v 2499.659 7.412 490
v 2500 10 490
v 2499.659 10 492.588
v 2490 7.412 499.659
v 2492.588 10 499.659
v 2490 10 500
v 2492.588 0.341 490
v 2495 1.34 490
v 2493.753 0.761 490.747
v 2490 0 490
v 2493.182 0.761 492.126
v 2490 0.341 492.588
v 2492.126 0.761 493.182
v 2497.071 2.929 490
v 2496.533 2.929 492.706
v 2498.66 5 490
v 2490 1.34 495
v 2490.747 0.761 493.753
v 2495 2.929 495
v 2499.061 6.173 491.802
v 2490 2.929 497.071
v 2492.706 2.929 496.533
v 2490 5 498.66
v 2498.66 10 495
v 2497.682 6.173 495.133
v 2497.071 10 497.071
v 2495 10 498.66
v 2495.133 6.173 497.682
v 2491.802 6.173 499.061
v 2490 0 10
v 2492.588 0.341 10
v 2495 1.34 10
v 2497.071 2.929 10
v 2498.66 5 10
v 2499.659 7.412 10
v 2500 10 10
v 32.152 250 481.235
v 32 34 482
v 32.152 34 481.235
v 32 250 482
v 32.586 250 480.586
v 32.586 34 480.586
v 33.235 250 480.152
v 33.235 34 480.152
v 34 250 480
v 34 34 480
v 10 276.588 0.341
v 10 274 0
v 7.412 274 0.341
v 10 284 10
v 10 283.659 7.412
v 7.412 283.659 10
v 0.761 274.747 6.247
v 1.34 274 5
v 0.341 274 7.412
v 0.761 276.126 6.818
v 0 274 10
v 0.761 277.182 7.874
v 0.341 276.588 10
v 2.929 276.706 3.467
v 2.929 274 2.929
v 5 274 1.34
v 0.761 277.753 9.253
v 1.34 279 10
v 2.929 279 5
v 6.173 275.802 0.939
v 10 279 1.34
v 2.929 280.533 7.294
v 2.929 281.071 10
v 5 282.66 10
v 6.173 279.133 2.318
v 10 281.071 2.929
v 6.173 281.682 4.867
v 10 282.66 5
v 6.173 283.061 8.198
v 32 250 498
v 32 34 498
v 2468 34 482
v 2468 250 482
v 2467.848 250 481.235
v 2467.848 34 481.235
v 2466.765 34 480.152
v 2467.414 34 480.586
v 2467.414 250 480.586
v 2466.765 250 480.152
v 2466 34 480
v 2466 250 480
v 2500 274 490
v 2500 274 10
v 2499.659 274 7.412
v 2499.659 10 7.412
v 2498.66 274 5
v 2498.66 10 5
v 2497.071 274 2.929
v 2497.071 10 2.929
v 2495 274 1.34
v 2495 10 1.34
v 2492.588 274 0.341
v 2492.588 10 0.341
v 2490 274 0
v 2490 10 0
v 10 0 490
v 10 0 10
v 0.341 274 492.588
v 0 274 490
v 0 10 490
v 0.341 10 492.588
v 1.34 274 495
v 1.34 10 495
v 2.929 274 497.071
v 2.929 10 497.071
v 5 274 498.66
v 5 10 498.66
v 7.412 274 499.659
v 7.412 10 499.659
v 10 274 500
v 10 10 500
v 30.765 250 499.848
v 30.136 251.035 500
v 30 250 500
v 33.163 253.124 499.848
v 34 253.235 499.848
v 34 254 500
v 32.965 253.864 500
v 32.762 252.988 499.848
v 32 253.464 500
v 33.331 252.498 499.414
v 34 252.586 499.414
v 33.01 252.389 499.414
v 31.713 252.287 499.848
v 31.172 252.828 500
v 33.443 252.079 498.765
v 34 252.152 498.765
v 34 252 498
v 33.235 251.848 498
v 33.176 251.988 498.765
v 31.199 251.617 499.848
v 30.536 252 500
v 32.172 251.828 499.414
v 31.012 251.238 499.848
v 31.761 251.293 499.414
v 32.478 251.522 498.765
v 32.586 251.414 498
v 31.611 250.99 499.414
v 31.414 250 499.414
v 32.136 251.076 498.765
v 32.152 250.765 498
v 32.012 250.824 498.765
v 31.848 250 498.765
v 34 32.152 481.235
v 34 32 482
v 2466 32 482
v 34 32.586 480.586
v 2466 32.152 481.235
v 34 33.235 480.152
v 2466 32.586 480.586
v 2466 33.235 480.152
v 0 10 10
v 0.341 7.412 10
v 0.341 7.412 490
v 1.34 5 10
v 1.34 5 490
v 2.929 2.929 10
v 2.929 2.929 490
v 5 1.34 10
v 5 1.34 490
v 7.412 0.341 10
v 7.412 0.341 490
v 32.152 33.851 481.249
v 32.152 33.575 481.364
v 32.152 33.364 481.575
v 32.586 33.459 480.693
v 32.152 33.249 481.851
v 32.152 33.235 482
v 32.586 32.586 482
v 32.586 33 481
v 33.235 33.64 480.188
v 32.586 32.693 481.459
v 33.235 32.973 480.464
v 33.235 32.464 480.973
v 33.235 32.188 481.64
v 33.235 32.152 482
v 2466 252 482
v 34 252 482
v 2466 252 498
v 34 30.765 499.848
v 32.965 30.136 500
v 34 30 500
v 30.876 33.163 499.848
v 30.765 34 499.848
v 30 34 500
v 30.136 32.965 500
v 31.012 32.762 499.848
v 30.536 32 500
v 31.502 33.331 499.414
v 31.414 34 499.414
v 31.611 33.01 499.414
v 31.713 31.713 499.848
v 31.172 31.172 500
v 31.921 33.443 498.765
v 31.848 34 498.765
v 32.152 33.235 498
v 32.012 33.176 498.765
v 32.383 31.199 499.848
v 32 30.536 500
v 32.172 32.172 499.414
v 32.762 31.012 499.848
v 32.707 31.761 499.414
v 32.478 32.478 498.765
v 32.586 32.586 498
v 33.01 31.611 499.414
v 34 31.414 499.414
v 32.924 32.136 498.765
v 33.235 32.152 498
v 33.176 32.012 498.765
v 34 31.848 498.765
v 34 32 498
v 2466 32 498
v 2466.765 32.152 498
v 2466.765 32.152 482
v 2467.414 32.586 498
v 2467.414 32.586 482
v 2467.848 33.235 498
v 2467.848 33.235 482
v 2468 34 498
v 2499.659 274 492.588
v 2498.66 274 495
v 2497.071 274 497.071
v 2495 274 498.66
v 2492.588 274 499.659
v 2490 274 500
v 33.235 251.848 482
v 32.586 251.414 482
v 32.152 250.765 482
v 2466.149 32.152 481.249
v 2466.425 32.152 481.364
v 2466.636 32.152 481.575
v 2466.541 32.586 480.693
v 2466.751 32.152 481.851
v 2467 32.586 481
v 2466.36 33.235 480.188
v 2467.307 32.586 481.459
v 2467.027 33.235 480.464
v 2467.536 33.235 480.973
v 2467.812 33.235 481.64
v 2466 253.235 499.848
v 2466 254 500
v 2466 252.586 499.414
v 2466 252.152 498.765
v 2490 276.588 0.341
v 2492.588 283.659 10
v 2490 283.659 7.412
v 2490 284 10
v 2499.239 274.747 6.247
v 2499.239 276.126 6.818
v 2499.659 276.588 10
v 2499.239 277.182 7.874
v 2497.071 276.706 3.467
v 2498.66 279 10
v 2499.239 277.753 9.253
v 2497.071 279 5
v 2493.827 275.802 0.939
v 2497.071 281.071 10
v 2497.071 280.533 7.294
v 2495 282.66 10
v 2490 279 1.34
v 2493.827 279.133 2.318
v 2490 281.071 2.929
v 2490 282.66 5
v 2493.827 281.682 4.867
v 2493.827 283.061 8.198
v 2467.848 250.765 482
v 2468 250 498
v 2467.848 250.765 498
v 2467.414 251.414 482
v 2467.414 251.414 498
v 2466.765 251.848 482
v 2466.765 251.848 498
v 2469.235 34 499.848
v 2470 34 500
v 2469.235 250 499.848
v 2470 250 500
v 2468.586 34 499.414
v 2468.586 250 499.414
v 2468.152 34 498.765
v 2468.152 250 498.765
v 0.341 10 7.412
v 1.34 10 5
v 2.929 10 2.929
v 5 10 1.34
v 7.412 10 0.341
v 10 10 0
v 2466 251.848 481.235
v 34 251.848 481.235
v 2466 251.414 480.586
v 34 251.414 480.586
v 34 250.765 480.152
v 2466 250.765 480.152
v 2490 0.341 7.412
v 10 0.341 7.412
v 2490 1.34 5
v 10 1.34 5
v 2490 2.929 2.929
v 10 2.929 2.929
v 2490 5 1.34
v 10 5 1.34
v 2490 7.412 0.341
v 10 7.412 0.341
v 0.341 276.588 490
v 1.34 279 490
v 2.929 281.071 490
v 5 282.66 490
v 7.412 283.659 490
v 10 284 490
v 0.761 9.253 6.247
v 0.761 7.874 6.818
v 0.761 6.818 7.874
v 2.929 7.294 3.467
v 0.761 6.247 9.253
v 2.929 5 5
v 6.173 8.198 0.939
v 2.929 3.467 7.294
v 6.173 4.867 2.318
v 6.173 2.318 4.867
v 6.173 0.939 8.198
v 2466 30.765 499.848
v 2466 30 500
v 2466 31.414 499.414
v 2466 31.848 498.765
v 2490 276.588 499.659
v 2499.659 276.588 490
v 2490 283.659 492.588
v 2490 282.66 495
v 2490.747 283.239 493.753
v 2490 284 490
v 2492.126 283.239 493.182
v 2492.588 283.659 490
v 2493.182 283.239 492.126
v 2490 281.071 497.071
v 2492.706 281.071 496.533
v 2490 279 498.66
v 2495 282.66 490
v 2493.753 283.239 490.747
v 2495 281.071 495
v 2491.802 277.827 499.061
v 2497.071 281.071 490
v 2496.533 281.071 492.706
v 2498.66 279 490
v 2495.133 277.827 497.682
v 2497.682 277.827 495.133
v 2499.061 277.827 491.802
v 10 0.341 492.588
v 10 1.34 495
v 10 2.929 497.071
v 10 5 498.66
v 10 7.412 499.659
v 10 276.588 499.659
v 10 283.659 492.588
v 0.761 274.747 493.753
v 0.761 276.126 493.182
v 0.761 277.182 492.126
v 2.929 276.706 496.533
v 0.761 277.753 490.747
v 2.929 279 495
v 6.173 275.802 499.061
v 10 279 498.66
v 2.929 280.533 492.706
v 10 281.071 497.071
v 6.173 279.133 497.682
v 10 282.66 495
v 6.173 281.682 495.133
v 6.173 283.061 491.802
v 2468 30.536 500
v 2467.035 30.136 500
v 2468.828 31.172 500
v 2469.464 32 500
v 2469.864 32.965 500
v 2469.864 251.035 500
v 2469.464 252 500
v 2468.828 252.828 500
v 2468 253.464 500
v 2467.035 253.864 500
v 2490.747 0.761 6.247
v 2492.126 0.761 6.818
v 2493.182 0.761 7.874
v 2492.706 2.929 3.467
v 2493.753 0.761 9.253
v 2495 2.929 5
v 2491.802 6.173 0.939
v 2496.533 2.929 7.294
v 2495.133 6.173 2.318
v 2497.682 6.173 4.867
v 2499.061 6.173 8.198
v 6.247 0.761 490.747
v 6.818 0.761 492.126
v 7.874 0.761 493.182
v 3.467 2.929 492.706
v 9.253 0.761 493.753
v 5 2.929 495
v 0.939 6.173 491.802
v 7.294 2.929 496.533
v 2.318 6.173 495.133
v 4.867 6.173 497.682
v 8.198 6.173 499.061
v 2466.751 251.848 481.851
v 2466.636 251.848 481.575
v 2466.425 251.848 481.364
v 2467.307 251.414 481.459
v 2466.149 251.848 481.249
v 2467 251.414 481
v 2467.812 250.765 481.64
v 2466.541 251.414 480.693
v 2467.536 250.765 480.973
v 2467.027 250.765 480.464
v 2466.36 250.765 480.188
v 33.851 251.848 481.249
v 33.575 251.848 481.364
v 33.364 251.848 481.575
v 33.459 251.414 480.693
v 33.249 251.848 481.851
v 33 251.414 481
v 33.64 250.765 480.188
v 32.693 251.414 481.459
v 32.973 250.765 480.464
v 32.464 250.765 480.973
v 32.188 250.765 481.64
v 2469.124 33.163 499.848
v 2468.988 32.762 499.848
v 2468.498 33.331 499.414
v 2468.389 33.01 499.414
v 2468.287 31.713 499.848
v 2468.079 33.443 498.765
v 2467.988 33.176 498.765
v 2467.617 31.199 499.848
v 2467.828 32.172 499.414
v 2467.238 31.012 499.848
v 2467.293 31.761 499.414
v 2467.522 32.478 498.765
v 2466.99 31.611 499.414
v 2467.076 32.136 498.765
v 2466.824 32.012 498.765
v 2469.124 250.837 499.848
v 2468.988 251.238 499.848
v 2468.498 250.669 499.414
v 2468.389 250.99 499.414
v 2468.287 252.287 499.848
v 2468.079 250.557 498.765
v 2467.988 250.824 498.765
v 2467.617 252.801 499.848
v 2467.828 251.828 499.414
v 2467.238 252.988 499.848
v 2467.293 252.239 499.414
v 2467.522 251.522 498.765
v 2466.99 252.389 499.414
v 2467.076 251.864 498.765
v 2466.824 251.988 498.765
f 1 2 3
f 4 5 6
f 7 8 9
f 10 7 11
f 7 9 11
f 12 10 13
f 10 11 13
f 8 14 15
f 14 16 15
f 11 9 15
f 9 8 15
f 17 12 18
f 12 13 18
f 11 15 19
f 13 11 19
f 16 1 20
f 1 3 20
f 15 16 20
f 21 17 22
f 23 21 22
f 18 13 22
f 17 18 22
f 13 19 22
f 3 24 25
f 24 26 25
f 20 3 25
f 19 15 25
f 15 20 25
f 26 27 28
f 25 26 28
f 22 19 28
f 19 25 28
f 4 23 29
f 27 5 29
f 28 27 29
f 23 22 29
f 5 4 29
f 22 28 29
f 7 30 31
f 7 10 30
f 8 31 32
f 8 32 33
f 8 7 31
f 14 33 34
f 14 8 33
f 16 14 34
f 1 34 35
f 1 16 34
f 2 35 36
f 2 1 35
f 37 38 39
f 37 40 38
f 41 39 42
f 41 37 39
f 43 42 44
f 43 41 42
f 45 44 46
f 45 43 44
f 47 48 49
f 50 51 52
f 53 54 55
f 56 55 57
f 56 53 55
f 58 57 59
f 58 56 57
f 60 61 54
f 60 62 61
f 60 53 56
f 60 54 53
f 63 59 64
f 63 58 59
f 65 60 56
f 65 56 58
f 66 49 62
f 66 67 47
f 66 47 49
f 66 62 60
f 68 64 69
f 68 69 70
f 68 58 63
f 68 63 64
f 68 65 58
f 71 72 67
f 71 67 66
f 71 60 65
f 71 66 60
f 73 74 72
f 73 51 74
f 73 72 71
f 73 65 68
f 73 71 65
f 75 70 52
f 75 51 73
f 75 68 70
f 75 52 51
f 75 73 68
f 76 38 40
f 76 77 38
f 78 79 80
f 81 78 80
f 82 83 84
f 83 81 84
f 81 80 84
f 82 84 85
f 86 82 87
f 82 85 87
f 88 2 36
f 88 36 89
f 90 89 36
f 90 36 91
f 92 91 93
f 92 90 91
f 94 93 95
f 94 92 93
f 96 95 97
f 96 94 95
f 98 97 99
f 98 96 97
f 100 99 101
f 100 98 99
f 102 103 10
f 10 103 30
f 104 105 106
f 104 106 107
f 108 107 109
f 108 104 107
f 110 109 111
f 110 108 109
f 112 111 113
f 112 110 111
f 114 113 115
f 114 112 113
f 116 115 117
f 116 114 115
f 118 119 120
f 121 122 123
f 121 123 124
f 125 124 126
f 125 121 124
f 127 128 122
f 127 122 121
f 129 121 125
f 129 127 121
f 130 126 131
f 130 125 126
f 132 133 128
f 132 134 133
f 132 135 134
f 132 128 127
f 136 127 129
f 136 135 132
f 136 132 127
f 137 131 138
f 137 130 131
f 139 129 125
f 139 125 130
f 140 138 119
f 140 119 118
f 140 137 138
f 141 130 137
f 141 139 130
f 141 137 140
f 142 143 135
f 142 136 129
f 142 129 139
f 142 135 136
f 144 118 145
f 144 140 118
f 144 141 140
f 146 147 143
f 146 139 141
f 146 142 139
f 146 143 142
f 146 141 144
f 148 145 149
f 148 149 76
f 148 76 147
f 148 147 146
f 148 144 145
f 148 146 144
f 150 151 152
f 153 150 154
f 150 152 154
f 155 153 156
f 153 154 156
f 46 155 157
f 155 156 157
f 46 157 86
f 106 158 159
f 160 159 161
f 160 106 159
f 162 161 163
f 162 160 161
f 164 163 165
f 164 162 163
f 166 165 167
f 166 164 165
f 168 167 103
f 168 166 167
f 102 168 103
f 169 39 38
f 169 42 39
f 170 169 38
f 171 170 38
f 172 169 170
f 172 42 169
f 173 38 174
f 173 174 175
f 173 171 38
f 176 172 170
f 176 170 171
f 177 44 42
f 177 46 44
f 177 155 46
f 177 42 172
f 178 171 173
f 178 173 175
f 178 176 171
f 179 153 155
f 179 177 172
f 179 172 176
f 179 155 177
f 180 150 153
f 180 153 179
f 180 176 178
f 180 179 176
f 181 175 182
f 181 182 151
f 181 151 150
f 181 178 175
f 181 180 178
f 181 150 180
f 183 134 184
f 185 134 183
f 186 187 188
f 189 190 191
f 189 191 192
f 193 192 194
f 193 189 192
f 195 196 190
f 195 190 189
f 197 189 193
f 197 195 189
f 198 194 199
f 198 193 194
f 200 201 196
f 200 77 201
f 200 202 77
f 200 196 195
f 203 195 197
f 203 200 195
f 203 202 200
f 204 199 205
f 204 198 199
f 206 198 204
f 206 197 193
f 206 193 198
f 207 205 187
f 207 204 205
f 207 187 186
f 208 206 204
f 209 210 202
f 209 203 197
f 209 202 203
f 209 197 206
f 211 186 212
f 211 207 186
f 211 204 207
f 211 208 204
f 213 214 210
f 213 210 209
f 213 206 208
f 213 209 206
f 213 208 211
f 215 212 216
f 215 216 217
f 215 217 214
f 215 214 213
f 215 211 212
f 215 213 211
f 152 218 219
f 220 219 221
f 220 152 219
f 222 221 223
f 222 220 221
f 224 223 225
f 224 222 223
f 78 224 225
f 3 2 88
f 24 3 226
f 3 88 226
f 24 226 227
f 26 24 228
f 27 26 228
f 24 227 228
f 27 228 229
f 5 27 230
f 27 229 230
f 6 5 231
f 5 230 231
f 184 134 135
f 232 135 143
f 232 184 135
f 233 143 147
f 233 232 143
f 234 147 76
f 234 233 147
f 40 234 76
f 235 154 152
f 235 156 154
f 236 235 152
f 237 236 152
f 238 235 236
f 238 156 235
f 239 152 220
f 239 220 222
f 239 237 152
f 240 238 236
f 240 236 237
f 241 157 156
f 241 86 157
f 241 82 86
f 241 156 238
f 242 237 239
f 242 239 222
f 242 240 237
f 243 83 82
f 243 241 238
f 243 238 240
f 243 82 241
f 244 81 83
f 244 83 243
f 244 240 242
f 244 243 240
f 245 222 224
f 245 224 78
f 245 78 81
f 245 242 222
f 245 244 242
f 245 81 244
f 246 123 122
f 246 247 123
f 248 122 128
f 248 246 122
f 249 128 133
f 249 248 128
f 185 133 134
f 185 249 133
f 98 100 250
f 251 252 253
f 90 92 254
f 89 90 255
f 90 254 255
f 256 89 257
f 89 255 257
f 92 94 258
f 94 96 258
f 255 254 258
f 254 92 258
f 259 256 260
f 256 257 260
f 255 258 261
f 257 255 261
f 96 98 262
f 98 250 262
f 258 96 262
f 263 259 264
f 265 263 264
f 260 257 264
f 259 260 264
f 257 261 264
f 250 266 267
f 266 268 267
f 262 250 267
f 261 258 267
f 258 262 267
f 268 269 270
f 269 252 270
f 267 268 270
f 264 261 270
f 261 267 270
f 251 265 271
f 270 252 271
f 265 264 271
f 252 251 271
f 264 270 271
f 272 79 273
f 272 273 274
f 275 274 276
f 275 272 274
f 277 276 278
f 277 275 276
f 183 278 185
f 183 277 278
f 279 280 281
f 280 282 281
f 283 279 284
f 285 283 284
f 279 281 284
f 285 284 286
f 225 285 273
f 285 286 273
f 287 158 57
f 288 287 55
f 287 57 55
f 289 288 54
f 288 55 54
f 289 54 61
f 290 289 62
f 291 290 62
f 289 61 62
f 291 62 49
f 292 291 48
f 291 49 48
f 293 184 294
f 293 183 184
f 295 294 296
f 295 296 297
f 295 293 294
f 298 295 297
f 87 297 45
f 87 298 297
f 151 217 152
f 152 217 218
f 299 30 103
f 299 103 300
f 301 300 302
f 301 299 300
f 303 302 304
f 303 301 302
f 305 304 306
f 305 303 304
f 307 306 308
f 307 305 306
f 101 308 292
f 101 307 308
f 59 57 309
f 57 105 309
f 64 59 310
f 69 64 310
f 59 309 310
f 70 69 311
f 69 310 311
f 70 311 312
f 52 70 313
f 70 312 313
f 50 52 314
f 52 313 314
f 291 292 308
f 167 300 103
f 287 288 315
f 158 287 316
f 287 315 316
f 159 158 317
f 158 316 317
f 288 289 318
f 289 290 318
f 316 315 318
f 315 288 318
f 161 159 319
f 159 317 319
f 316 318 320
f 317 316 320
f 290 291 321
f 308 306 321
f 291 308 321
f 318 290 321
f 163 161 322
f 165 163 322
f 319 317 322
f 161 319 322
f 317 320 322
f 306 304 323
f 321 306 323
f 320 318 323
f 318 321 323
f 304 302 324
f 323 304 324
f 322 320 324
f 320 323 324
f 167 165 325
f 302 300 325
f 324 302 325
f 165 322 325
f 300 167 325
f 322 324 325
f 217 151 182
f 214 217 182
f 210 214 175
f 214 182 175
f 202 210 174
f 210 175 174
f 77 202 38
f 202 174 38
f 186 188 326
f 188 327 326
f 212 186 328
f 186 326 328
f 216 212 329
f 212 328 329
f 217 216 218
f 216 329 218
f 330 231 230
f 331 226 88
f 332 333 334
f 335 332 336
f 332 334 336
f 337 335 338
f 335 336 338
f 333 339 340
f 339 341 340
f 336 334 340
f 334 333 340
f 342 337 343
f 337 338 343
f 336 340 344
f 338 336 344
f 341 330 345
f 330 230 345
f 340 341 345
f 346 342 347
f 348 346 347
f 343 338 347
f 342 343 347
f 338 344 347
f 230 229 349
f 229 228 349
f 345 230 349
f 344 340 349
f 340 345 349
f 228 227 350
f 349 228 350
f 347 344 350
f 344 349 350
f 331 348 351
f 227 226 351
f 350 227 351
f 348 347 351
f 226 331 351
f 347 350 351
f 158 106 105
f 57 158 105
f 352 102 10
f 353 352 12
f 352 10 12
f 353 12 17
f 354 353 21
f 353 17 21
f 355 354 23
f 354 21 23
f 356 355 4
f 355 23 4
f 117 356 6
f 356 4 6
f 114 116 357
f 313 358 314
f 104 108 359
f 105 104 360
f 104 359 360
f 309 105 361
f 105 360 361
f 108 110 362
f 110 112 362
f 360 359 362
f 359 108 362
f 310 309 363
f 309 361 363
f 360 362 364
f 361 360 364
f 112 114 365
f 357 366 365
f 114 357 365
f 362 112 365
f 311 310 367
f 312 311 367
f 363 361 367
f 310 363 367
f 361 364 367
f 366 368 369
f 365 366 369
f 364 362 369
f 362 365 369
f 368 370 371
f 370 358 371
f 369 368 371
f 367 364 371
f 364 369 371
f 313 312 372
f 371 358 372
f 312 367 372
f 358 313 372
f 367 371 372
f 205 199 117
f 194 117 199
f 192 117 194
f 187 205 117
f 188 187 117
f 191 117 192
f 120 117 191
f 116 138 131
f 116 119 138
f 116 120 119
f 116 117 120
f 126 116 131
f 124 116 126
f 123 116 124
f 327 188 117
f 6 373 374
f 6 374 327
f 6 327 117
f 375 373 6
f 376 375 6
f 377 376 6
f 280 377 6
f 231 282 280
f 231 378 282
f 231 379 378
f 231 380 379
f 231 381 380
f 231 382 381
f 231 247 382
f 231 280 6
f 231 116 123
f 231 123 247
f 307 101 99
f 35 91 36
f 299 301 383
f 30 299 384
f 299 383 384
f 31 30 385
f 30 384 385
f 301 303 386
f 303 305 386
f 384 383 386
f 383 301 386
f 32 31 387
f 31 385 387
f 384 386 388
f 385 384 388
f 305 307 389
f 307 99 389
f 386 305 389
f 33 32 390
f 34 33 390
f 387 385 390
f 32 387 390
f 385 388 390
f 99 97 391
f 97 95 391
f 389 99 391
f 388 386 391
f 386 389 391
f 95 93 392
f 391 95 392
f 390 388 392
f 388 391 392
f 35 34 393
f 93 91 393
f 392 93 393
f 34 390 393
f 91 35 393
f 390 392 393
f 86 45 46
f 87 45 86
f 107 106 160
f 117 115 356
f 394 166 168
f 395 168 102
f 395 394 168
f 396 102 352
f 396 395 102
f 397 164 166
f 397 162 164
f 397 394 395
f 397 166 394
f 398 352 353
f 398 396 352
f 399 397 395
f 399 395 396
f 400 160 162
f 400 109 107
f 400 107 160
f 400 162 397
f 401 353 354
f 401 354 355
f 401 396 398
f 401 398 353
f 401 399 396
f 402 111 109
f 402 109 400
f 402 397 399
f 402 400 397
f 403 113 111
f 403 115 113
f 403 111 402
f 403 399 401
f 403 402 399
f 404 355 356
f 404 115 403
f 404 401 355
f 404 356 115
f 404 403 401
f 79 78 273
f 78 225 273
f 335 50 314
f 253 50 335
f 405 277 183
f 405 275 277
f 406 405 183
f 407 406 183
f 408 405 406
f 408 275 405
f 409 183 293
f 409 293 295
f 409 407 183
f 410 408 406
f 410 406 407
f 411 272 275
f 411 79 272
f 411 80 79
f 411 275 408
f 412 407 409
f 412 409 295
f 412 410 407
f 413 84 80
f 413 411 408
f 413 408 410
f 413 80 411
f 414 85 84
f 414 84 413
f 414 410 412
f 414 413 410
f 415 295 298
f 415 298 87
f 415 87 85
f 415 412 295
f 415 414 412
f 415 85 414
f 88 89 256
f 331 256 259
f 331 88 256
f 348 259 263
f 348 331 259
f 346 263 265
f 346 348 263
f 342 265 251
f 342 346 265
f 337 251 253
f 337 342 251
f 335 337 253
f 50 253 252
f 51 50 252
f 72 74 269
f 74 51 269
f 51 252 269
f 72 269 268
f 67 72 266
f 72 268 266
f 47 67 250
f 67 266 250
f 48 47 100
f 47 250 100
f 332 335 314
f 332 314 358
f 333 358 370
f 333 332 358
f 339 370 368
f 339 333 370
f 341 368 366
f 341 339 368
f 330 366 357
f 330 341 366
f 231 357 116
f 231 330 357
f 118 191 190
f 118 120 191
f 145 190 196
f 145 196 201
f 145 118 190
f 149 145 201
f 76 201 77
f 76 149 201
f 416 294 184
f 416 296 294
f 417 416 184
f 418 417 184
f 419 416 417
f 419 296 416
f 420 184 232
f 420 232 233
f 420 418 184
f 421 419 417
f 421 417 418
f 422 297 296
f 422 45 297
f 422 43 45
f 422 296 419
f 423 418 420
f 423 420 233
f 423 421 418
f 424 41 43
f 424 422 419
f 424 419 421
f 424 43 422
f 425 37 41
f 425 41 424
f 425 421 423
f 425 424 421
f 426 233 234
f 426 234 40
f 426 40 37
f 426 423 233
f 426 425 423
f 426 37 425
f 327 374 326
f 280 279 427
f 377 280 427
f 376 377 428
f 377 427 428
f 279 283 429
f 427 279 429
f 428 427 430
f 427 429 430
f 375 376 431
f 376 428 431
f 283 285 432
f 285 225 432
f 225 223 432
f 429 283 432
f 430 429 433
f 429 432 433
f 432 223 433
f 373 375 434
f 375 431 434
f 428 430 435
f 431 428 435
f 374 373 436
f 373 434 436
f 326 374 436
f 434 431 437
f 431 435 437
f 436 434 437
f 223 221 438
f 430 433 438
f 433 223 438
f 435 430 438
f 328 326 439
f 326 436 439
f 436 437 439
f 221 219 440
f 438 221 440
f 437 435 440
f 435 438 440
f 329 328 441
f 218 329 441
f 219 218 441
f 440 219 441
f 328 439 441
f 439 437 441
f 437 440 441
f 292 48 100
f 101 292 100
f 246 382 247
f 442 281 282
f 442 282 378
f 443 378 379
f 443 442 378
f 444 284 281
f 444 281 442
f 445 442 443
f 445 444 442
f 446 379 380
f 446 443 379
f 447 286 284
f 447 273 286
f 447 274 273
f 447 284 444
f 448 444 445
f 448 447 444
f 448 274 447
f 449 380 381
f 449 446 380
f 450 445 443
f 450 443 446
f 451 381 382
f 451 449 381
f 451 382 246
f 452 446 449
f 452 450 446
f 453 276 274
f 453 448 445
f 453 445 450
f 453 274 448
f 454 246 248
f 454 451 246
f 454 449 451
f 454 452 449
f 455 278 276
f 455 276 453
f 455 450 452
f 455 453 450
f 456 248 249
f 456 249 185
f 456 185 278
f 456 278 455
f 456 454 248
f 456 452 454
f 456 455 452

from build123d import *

# Parameters (mm, degrees)
SKETCH1_W           = 2500
SKETCH1_H           = 284
BOSS_EXTRUDE1_DEPTH = 500
FILLET1_R           = 10
SKETCH2_W           = 2436
SKETCH2_H           = 220
CUT_EXTRUDE1_DEPTH  = 20
FILLET2_R           = 2


with BuildPart() as part:
    # Sketch1 → Boss-Extrude1 (new body)
    with BuildSketch(Plane.XY):
        with Locations((1250, 142)):
            Rectangle(SKETCH1_W, SKETCH1_H)
    extrude(amount=BOSS_EXTRUDE1_DEPTH)

    # Fillet1
    fillet1_edges = [part.edges().sort_by_distance(p)[0] for p in [
        (2500, 142, 500),
        (1250, 284, 500),
        (0, 142, 500),
        (1250, 284, 0),
        (2500, 142, 0),
        (1250, 0, 0),
        (0, 142, 0),
        (0, 284, 250),
        (2500, 284, 250),
        (2500, 0, 250),
        (0, 0, 250),
        (1250, 0, 500),
    ]]
    fillet(fillet1_edges, radius=FILLET1_R)

    # Sketch2 → Cut-Extrude1 (cut)
    with BuildSketch(Plane.XY.offset(500)):
        with Locations((1250, 142)):
            Rectangle(SKETCH2_W, SKETCH2_H)
    extrude(amount=-CUT_EXTRUDE1_DEPTH, mode=Mode.SUBTRACT)

    # Fillet2
    fillet2_edges = [part.edges().sort_by_distance(p)[0] for p in [
        (2468, 142, 480),
        (2468, 252, 490),
        (1250, 32, 480),
        (2468, 32, 490),
        (32, 142, 480),
        (32, 32, 490),
        (1250, 252, 480),
        (32, 252, 490),
        (2468, 142, 500),
        (1250, 252, 500),
        (32, 142, 500),
        (1250, 32, 500),
    ]]
    fillet(fillet2_edges, radius=FILLET2_R)


solid = part.part
